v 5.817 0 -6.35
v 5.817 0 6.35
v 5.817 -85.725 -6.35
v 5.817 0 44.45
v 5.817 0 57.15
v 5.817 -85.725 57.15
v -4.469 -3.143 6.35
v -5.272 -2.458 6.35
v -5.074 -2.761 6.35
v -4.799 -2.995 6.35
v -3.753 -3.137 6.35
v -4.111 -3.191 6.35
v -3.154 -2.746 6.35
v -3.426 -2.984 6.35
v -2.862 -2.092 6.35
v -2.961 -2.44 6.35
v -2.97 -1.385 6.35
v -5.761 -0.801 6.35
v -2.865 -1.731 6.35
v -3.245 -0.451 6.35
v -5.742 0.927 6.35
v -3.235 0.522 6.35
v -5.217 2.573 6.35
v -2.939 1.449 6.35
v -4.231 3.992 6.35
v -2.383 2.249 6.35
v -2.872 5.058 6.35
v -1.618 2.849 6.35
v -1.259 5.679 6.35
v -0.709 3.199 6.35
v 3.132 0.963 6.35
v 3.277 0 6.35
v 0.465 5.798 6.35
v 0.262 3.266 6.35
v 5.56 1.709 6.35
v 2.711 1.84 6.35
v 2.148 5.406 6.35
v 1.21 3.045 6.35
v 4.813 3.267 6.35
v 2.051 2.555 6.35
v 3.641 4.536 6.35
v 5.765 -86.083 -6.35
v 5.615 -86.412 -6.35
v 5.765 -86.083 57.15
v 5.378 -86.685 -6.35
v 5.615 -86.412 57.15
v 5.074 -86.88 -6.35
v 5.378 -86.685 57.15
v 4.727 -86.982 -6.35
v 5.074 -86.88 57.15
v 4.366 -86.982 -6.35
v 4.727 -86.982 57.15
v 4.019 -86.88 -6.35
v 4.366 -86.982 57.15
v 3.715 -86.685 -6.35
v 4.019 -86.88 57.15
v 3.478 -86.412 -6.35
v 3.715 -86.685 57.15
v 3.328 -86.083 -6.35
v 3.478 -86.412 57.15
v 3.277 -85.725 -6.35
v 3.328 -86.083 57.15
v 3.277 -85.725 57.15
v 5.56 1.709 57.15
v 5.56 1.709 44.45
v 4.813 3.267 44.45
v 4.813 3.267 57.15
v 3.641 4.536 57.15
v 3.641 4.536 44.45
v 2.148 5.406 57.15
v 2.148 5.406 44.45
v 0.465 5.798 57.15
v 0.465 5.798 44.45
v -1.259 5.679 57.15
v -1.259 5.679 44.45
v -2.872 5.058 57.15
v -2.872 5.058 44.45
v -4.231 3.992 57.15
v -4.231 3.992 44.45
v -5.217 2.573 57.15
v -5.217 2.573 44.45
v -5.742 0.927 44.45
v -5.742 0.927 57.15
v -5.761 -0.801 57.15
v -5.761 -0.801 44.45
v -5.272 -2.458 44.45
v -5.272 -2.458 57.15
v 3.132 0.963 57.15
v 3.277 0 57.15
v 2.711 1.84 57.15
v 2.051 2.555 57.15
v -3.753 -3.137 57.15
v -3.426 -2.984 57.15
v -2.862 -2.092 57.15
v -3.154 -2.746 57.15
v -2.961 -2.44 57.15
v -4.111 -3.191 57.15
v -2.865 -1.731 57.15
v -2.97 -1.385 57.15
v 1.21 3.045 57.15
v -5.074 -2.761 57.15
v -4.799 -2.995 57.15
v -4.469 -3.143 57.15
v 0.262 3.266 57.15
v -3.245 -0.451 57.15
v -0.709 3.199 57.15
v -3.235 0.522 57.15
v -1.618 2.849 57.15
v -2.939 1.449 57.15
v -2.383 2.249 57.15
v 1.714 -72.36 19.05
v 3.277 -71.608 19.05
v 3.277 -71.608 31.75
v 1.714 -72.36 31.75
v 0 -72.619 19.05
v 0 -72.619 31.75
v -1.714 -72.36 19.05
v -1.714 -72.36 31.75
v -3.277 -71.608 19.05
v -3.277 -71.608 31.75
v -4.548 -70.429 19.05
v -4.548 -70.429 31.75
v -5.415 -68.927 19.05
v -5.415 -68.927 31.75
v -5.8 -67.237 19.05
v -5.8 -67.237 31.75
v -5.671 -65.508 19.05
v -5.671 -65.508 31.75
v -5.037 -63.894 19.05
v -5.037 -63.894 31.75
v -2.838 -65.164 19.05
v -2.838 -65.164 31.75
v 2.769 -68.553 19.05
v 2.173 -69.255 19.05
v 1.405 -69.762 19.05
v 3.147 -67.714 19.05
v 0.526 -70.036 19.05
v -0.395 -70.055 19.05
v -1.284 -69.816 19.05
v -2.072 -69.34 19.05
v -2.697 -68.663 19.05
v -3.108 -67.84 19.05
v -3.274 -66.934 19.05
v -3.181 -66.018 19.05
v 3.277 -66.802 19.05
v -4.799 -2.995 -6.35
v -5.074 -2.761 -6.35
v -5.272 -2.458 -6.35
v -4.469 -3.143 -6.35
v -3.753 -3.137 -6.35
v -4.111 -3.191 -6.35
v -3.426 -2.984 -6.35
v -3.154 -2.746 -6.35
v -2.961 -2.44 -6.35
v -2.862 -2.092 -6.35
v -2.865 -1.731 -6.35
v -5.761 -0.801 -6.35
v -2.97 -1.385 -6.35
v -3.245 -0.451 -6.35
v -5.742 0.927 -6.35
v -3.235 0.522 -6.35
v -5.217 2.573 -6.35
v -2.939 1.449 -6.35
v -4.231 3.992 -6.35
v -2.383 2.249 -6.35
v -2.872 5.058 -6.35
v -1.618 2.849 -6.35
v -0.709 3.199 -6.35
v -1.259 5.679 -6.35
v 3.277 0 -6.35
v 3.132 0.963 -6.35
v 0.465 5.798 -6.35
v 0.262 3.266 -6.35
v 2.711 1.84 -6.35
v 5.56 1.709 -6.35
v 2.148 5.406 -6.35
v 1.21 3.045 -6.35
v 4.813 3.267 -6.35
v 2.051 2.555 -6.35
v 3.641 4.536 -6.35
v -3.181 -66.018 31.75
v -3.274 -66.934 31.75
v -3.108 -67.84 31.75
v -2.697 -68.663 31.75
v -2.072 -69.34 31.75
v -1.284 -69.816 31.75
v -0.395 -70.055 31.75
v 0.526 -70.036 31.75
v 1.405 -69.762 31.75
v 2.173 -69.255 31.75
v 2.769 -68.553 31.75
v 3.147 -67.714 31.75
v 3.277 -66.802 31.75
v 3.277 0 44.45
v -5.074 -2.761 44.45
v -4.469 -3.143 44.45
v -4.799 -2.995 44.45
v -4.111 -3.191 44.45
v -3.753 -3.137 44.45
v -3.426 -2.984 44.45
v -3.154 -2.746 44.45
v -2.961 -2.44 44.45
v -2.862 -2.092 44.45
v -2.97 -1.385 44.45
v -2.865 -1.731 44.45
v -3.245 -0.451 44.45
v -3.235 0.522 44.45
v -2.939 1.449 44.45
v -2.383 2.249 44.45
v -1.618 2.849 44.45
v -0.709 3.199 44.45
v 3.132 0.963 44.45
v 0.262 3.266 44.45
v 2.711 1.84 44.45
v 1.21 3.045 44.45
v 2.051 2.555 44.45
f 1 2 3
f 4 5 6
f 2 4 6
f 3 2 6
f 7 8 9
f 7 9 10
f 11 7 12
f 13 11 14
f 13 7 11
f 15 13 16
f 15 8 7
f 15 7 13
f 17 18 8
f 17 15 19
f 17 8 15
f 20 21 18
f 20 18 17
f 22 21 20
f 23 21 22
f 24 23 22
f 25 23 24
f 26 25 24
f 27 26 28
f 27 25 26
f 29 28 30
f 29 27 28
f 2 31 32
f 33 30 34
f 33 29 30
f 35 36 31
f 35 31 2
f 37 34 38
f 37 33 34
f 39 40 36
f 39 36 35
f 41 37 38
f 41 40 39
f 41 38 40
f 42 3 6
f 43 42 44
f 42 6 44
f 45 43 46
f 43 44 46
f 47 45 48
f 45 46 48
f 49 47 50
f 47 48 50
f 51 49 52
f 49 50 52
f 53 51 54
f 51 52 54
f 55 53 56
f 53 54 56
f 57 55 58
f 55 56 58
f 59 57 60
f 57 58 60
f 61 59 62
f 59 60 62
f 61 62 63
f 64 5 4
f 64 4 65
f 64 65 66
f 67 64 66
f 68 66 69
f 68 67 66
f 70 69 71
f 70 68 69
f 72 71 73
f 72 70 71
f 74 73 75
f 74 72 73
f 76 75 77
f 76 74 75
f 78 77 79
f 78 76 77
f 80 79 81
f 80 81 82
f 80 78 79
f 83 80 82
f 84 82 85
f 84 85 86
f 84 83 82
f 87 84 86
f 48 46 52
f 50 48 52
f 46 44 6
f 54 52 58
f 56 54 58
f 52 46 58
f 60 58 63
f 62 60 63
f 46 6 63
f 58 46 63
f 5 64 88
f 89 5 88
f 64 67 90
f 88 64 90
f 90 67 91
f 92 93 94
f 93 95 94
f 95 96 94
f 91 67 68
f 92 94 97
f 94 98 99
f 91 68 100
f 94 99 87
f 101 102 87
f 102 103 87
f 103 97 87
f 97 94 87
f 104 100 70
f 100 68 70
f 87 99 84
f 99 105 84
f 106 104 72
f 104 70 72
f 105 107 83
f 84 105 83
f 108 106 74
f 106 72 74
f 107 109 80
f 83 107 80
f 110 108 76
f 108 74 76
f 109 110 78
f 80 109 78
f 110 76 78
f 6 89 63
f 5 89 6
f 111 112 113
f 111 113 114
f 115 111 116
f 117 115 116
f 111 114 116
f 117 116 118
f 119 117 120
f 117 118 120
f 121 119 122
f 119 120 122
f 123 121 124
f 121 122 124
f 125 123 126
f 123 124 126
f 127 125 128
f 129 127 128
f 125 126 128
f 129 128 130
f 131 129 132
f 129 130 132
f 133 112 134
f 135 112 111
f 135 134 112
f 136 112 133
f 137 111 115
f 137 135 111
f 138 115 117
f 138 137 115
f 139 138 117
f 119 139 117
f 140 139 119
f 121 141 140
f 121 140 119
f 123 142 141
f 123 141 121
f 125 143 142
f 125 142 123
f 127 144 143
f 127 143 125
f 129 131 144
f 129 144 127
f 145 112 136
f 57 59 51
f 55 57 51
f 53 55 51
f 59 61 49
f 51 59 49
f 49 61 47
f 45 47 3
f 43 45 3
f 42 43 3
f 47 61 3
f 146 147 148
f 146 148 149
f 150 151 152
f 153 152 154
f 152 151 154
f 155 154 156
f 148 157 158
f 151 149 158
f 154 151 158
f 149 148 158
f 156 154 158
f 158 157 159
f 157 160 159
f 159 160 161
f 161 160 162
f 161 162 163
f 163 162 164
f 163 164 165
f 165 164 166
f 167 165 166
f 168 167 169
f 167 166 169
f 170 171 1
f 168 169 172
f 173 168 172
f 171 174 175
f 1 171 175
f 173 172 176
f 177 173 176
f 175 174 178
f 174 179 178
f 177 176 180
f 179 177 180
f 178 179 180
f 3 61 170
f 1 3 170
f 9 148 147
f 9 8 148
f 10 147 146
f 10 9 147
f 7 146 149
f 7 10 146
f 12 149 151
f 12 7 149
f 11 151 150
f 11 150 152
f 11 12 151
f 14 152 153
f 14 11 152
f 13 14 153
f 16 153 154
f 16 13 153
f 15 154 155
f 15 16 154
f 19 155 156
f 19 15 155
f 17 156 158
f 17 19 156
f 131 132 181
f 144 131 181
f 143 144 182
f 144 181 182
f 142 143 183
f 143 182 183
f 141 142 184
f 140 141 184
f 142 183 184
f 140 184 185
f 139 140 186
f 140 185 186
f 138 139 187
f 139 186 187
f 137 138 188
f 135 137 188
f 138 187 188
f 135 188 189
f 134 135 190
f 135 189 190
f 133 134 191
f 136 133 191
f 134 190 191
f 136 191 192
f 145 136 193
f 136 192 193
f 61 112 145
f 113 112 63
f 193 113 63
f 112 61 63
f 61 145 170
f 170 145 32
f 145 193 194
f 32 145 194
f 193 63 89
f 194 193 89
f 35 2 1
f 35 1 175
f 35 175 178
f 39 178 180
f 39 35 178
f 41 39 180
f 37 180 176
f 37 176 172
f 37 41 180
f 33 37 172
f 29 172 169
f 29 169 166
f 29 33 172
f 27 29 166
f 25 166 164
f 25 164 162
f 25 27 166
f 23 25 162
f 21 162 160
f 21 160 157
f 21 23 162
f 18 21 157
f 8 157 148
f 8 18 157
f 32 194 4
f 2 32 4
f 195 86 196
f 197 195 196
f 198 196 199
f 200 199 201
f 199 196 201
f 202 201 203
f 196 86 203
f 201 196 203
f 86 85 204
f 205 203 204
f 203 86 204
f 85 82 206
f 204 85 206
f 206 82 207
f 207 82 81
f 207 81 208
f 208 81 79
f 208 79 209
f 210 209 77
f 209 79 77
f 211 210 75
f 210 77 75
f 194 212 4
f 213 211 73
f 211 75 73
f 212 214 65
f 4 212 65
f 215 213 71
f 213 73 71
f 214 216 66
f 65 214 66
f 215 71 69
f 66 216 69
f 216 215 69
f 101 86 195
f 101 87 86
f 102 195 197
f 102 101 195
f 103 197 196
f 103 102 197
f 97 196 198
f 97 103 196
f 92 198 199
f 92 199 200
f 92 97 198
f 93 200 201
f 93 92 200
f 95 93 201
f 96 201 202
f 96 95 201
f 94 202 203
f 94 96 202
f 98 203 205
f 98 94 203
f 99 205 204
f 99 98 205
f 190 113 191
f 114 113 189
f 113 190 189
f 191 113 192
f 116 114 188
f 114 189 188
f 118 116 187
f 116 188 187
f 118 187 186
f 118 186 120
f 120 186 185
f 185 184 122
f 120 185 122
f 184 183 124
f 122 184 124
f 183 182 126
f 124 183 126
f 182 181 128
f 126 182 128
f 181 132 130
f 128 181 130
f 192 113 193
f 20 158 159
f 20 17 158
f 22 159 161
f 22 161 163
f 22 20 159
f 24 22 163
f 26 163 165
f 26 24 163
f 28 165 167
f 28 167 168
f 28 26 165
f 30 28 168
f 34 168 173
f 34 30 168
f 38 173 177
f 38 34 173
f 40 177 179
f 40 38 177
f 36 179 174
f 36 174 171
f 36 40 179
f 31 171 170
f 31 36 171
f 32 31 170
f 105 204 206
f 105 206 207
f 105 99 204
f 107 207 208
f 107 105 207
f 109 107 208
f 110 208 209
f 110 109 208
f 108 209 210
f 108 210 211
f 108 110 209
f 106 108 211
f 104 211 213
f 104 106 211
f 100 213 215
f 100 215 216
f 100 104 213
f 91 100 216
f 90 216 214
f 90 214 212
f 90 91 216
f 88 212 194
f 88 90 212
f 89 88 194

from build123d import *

# Parameters (mm, degrees)
BOSS_EXTRUDE1_DEPTH = 6.35
BOSS_EXTRUDE2_START = 50.8
BOSS_EXTRUDE2_DEPTH = 50.8
LPATTERN1_COUNT     = 2
LPATTERN1_PITCH     = 50.8
BOSS_EXTRUDE3_DEPTH = 6.35


with BuildPart() as part:
    # Sketch1 → Boss-Extrude1 (new, symmetric)
    with BuildSketch(Plane.XY):
        with BuildLine():
            Line((3.2766, 0), (3.2766, -85.725))
            ThreePointArc((3.2766, -85.725), (4.5466, -86.995), (5.8166, -85.725))
            Line((5.8166, -85.725), (5.8166, 0))
            ThreePointArc((5.8166, 0), (-1.258942658, 5.678723355), (-5.271629874, -2.458201381))
            ThreePointArc((-5.271629874, -2.458201381), (-3.583893792, -3.072487078), (-2.969608095, -1.384750996))
            ThreePointArc((-2.969608095, -1.384750996), (-0.709186039, 3.198931497), (3.2766, 0))
        make_face()
    boss_extrude1 = extrude(amount=BOSS_EXTRUDE1_DEPTH, both=True)

    # Sketch2 → Boss-Extrude2 (add)
    with BuildSketch(Plane.XY.offset(6.35).offset(BOSS_EXTRUDE2_START)):
        with BuildLine():
            Line((3.2766, 0), (5.8166, 0))
            Line((5.8166, 0), (5.8166, -85.725))
            ThreePointArc((5.8166, -85.725), (4.5466, -86.995), (3.2766, -85.725))
            Line((3.2766, -85.725), (3.2766, 0))
        make_face()
    extrude(amount=-BOSS_EXTRUDE2_DEPTH)

    # LPattern1: Boss-Extrude1 ×2
    with Locations(*[(0, 0, i * LPATTERN1_PITCH) for i in range(1, LPATTERN1_COUNT)]):
        add(boss_extrude1)

    # Sketch4 → Boss-Extrude3 (add, symmetric)
    with BuildSketch(Plane.XY.offset(25.4)):
        with BuildLine():
            Line((3.2766, -66.802), (3.2766, -71.607905534))
            ThreePointArc((3.2766, -71.607905534), (-3.956296051, -71.065866451), (-5.037323364, -63.8937))
            Line((-5.037323364, -63.8937), (-2.837618838, -65.1637))
            ThreePointArc((-2.837618838, -65.1637), (-0.848046483, -69.966952562), (3.2766, -66.802))
        make_face()
    extrude(amount=BOSS_EXTRUDE3_DEPTH, both=True)


solid = part.part
